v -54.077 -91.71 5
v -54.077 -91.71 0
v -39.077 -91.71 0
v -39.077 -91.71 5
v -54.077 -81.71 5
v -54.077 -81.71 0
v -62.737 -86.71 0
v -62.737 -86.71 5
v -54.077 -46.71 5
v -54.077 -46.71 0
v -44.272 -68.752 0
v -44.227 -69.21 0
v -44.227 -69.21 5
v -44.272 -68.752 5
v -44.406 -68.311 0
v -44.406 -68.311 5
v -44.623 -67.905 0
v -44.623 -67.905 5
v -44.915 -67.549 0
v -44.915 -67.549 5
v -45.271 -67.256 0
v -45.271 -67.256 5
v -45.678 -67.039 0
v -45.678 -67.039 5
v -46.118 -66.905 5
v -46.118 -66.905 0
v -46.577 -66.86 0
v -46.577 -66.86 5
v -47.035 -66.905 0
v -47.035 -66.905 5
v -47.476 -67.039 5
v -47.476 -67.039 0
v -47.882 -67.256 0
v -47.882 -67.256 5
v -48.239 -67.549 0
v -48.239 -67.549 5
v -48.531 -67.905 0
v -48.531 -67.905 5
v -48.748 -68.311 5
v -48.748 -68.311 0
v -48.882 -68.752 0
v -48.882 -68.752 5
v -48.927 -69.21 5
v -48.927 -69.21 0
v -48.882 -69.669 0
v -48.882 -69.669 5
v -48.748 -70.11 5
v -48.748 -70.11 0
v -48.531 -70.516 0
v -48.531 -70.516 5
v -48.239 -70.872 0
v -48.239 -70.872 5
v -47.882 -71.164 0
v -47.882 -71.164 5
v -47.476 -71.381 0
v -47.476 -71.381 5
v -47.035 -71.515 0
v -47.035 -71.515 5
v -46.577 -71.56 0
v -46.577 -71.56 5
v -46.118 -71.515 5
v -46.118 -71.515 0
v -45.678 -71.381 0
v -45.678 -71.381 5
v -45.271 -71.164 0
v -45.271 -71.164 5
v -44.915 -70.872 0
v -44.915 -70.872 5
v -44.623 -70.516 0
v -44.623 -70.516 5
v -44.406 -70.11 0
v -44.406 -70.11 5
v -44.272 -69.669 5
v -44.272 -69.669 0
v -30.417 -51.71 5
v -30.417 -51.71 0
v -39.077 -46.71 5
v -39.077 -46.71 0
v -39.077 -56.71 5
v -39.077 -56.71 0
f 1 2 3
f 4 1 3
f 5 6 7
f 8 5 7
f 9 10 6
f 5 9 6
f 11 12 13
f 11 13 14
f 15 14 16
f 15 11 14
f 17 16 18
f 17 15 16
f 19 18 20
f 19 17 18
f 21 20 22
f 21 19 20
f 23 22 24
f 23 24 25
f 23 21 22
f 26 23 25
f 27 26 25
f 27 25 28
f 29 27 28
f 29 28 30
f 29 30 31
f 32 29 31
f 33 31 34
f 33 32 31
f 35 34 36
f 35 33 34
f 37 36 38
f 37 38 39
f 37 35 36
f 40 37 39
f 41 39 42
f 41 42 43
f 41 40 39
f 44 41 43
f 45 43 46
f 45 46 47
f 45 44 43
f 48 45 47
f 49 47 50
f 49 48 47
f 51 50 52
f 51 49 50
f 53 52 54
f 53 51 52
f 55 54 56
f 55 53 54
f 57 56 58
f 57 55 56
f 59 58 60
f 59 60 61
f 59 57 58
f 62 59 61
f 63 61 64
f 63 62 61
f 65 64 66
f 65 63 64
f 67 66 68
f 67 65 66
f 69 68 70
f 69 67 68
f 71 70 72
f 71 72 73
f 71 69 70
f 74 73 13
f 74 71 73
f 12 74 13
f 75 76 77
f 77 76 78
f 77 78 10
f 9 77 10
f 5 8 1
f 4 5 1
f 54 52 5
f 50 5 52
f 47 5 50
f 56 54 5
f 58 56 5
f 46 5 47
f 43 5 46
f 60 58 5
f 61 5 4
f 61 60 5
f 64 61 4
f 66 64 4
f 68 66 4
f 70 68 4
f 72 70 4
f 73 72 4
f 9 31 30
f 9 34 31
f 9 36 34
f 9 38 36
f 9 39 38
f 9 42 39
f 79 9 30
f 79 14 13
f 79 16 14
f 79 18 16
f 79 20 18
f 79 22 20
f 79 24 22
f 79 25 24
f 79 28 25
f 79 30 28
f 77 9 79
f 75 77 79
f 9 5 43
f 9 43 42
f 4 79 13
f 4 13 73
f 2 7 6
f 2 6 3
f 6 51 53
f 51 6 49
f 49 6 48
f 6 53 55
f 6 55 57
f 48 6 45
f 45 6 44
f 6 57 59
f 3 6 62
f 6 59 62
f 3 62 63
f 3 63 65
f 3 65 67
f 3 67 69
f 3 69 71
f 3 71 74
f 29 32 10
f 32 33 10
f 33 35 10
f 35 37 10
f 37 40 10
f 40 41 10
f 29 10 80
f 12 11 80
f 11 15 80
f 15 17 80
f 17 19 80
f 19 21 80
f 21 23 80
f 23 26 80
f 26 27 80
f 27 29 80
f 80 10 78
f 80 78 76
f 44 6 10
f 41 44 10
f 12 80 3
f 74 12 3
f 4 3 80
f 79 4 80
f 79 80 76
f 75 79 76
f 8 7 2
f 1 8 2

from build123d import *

# Parameters (mm, degrees)
F0_R     = 2.35
F1_DEPTH = 5


with BuildPart() as f1:
    # F0 (on Top) → F1 (new body)
    with BuildSketch(Plane.XY):
        Polygon((-39.076904, -51.710204), (-39.076904, -46.710204), (-54.076904, -46.710204), (-54.076904, -81.710204), (-54.076904, -86.710204), (-54.076904, -91.710204), (-39.076904, -91.710204), (-39.076904, -56.710204), align=None)
        with Locations((-46.576904, -69.210204)):
            Circle(F0_R, mode=Mode.SUBTRACT)
        Polygon((-30.41665, -51.710204), (-39.076904, -46.710204), (-39.076904, -51.710204), align=None)
        Polygon((-30.41665, -51.710204), (-39.076904, -51.710204), (-39.076904, -56.710204), align=None)
        Polygon((-54.076904, -86.710204), (-54.076904, -81.710204), (-62.737158, -86.710204), align=None)
        Polygon((-54.076904, -91.710204), (-54.076904, -86.710204), (-62.737158, -86.710204), align=None)
    extrude(amount=F1_DEPTH)


solid = f1.part
